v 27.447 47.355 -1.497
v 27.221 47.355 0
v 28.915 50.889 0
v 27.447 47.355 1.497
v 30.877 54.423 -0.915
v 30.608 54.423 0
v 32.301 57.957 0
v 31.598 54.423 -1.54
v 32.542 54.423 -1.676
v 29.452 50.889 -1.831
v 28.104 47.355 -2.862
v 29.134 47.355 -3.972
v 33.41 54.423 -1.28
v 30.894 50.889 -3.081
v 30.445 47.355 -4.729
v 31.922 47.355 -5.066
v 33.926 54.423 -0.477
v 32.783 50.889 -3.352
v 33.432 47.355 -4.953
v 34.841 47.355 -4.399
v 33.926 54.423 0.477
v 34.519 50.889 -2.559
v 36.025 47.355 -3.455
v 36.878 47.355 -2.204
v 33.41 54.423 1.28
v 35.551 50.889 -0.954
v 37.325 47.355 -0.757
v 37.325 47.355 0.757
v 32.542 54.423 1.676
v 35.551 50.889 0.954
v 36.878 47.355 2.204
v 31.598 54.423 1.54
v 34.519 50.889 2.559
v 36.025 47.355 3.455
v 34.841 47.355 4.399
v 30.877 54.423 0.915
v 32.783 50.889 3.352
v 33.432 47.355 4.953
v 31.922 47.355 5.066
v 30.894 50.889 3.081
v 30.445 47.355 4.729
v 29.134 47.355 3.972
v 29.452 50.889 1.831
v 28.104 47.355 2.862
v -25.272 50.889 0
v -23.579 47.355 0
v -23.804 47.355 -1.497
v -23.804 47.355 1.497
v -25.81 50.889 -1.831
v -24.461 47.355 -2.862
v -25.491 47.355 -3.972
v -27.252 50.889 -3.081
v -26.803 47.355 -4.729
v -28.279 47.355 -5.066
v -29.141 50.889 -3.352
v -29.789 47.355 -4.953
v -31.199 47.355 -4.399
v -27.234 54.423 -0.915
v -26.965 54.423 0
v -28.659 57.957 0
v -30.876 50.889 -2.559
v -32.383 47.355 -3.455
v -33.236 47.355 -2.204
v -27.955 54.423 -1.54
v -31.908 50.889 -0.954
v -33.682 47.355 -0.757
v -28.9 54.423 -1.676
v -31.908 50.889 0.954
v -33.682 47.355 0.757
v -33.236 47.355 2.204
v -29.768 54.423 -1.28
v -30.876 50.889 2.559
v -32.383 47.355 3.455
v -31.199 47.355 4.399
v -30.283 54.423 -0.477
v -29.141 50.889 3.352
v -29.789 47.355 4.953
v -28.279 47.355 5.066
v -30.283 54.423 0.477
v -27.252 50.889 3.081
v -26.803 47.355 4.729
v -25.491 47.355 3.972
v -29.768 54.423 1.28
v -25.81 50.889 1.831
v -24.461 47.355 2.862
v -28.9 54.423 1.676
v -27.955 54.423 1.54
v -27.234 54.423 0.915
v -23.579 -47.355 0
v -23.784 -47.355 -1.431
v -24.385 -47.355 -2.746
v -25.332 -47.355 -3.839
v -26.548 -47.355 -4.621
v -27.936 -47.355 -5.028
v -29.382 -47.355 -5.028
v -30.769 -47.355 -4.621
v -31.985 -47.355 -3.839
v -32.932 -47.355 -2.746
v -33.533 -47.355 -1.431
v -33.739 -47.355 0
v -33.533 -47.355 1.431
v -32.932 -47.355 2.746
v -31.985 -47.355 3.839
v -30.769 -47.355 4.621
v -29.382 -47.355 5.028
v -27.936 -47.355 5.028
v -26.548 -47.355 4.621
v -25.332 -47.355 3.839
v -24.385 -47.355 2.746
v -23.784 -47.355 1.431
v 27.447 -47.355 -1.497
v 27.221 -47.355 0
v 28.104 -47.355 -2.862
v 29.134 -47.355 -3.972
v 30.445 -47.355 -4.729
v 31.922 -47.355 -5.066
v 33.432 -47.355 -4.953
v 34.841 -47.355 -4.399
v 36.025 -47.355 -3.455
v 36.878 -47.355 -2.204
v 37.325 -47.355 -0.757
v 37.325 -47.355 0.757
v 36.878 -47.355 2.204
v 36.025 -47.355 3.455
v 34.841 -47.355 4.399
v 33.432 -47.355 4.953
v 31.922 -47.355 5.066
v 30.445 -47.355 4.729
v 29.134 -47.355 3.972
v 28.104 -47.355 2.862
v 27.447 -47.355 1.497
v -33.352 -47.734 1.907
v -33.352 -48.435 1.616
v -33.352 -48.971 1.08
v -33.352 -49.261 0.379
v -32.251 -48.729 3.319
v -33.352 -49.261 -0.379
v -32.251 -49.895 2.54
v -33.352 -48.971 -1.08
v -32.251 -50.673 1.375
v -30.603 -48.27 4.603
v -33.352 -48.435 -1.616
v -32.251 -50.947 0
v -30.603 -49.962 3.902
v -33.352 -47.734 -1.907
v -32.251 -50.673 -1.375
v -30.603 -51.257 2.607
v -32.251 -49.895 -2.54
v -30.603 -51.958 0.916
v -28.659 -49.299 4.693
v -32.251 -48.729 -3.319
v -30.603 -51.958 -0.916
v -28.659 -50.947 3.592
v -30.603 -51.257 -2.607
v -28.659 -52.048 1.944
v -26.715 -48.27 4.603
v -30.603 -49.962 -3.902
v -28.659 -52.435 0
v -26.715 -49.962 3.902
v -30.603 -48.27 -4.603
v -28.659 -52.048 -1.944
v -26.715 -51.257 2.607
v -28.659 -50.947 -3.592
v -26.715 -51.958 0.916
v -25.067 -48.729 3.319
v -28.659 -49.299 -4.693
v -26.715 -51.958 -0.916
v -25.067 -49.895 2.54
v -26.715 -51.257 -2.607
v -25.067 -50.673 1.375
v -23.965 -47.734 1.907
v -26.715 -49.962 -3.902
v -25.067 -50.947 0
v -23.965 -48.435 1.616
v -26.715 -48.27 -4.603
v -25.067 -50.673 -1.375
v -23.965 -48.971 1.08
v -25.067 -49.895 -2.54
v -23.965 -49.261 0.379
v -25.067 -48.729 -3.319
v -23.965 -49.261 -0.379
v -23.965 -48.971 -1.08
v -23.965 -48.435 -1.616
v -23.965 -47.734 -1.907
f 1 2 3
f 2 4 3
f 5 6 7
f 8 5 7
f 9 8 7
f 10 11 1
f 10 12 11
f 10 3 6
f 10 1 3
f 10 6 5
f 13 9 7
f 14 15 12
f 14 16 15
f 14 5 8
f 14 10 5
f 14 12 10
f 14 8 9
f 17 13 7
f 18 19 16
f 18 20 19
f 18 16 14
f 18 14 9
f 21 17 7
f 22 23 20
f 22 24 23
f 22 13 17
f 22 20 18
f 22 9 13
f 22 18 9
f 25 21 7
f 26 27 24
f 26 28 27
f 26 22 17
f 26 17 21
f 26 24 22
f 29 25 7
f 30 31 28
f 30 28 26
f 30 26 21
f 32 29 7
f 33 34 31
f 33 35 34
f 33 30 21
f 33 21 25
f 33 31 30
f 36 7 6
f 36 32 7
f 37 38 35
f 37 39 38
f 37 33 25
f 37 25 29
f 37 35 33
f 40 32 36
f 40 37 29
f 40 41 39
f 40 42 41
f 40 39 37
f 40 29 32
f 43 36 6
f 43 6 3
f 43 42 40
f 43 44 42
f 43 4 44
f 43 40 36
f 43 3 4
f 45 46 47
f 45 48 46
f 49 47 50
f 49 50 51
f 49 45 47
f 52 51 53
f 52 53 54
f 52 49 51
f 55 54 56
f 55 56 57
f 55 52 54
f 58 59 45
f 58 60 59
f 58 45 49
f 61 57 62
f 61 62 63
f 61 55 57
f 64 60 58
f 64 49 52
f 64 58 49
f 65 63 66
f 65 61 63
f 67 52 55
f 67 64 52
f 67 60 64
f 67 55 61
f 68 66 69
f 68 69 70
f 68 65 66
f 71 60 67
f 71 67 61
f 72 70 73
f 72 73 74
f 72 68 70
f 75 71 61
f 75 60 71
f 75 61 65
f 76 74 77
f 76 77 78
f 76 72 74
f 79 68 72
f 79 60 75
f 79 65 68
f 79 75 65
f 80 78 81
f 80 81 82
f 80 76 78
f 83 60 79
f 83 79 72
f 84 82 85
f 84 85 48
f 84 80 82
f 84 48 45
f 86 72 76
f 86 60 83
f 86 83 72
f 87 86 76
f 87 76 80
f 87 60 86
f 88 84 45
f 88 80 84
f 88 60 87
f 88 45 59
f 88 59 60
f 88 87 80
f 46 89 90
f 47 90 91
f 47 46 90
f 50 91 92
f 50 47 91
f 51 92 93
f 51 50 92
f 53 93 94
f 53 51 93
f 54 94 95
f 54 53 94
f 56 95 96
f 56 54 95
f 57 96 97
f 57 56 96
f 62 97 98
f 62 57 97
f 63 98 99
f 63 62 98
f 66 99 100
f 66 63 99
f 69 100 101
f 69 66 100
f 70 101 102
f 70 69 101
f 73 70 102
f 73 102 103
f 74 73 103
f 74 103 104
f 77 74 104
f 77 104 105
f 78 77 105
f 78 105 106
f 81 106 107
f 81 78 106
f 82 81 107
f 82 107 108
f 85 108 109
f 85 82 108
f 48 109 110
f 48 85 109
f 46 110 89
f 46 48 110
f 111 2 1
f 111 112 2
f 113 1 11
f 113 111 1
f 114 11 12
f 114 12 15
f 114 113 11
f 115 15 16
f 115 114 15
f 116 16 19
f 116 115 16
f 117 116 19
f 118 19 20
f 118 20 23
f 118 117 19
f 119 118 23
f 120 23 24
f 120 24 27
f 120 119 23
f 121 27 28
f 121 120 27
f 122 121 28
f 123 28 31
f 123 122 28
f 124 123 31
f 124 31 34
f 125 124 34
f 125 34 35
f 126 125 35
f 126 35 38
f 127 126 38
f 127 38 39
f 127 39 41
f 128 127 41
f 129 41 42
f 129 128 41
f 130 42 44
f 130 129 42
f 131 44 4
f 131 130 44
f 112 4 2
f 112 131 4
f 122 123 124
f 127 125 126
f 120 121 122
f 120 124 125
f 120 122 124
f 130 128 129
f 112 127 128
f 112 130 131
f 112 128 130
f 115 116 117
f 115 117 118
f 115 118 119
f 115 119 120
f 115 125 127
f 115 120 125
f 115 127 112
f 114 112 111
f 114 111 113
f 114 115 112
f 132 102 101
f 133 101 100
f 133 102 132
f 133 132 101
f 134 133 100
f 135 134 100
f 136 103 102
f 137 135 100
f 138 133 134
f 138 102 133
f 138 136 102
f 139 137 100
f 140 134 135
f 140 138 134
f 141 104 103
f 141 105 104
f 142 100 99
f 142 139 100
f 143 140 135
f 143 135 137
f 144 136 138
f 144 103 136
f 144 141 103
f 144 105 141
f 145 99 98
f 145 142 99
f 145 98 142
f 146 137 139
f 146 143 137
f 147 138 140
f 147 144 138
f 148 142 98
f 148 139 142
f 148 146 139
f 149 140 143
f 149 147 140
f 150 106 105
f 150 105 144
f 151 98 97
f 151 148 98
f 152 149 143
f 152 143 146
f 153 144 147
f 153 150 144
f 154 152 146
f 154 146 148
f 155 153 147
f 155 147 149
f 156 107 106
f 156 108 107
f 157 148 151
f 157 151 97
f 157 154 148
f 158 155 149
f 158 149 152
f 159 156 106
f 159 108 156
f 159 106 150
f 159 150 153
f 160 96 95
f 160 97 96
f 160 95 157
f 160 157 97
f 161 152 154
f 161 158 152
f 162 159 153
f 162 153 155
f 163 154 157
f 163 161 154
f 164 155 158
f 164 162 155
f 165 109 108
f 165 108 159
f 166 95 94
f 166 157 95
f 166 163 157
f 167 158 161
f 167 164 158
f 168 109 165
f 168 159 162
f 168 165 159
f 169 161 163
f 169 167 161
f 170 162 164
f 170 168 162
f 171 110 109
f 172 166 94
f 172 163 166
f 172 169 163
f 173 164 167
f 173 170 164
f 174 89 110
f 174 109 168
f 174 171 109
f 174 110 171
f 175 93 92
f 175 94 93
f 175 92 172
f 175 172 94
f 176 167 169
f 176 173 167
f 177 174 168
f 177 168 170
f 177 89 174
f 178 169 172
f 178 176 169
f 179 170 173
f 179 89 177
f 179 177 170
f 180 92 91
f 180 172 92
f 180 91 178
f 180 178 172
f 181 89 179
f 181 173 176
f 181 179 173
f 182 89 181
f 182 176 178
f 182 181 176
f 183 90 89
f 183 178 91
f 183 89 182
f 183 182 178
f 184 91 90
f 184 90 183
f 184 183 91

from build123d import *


# Not quite as in the source:
# - the program builds the solid bodies; features that only make, move or delete a surface that nothing else refers to are left out


with BuildPart() as f1:
    # F0 (on Top) → F1 (revolve)
    with BuildSketch(Plane.XY):
        Polygon((-23.5786662051, -47.3545584765), (-23.5786662051, 47.3545584765), (-28.6586662051, 57.9565837979), (-28.6586662051, 47.3545584765), (-28.6586662051, -47.3545584765), align=None)
    revolve(axis=Axis((-28.6586662051, 0, 0), (0, 1, 0)))

    # F0 (on Top) → F4 (revolve)
    with BuildSketch(Plane.XY):
        with BuildLine():
            ThreePointArc((-33.7386662051, -47.3545584765), (-28.6586662051, -52.4345584765), (-23.5786662051, -47.3545584765))
            Line((-23.5786662051, -47.3545584765), (-28.6586662051, -47.3545584765))
            Line((-28.6586662051, -47.3545584765), (-33.7386662051, -47.3545584765))
        make_face()
    revolve(axis=Axis((-28.6586662051, -47.3545584765, 0), (1, 0, 0)))


with BuildPart() as f2:
    # F0 (on Top) → F2 (revolve)
    with BuildSketch(Plane.XY):
        Polygon((32.3013337949, 57.9565837979), (27.2213337949, 47.3545584765), (27.2213337949, -47.3545584765), (32.3013337949, -47.3545584765), (32.3013337949, 47.3545584765), align=None)
    revolve(axis=Axis((32.3013337949, 0, 0), (0, -1, 0)))


solid = Compound([f1.part, f2.part])
